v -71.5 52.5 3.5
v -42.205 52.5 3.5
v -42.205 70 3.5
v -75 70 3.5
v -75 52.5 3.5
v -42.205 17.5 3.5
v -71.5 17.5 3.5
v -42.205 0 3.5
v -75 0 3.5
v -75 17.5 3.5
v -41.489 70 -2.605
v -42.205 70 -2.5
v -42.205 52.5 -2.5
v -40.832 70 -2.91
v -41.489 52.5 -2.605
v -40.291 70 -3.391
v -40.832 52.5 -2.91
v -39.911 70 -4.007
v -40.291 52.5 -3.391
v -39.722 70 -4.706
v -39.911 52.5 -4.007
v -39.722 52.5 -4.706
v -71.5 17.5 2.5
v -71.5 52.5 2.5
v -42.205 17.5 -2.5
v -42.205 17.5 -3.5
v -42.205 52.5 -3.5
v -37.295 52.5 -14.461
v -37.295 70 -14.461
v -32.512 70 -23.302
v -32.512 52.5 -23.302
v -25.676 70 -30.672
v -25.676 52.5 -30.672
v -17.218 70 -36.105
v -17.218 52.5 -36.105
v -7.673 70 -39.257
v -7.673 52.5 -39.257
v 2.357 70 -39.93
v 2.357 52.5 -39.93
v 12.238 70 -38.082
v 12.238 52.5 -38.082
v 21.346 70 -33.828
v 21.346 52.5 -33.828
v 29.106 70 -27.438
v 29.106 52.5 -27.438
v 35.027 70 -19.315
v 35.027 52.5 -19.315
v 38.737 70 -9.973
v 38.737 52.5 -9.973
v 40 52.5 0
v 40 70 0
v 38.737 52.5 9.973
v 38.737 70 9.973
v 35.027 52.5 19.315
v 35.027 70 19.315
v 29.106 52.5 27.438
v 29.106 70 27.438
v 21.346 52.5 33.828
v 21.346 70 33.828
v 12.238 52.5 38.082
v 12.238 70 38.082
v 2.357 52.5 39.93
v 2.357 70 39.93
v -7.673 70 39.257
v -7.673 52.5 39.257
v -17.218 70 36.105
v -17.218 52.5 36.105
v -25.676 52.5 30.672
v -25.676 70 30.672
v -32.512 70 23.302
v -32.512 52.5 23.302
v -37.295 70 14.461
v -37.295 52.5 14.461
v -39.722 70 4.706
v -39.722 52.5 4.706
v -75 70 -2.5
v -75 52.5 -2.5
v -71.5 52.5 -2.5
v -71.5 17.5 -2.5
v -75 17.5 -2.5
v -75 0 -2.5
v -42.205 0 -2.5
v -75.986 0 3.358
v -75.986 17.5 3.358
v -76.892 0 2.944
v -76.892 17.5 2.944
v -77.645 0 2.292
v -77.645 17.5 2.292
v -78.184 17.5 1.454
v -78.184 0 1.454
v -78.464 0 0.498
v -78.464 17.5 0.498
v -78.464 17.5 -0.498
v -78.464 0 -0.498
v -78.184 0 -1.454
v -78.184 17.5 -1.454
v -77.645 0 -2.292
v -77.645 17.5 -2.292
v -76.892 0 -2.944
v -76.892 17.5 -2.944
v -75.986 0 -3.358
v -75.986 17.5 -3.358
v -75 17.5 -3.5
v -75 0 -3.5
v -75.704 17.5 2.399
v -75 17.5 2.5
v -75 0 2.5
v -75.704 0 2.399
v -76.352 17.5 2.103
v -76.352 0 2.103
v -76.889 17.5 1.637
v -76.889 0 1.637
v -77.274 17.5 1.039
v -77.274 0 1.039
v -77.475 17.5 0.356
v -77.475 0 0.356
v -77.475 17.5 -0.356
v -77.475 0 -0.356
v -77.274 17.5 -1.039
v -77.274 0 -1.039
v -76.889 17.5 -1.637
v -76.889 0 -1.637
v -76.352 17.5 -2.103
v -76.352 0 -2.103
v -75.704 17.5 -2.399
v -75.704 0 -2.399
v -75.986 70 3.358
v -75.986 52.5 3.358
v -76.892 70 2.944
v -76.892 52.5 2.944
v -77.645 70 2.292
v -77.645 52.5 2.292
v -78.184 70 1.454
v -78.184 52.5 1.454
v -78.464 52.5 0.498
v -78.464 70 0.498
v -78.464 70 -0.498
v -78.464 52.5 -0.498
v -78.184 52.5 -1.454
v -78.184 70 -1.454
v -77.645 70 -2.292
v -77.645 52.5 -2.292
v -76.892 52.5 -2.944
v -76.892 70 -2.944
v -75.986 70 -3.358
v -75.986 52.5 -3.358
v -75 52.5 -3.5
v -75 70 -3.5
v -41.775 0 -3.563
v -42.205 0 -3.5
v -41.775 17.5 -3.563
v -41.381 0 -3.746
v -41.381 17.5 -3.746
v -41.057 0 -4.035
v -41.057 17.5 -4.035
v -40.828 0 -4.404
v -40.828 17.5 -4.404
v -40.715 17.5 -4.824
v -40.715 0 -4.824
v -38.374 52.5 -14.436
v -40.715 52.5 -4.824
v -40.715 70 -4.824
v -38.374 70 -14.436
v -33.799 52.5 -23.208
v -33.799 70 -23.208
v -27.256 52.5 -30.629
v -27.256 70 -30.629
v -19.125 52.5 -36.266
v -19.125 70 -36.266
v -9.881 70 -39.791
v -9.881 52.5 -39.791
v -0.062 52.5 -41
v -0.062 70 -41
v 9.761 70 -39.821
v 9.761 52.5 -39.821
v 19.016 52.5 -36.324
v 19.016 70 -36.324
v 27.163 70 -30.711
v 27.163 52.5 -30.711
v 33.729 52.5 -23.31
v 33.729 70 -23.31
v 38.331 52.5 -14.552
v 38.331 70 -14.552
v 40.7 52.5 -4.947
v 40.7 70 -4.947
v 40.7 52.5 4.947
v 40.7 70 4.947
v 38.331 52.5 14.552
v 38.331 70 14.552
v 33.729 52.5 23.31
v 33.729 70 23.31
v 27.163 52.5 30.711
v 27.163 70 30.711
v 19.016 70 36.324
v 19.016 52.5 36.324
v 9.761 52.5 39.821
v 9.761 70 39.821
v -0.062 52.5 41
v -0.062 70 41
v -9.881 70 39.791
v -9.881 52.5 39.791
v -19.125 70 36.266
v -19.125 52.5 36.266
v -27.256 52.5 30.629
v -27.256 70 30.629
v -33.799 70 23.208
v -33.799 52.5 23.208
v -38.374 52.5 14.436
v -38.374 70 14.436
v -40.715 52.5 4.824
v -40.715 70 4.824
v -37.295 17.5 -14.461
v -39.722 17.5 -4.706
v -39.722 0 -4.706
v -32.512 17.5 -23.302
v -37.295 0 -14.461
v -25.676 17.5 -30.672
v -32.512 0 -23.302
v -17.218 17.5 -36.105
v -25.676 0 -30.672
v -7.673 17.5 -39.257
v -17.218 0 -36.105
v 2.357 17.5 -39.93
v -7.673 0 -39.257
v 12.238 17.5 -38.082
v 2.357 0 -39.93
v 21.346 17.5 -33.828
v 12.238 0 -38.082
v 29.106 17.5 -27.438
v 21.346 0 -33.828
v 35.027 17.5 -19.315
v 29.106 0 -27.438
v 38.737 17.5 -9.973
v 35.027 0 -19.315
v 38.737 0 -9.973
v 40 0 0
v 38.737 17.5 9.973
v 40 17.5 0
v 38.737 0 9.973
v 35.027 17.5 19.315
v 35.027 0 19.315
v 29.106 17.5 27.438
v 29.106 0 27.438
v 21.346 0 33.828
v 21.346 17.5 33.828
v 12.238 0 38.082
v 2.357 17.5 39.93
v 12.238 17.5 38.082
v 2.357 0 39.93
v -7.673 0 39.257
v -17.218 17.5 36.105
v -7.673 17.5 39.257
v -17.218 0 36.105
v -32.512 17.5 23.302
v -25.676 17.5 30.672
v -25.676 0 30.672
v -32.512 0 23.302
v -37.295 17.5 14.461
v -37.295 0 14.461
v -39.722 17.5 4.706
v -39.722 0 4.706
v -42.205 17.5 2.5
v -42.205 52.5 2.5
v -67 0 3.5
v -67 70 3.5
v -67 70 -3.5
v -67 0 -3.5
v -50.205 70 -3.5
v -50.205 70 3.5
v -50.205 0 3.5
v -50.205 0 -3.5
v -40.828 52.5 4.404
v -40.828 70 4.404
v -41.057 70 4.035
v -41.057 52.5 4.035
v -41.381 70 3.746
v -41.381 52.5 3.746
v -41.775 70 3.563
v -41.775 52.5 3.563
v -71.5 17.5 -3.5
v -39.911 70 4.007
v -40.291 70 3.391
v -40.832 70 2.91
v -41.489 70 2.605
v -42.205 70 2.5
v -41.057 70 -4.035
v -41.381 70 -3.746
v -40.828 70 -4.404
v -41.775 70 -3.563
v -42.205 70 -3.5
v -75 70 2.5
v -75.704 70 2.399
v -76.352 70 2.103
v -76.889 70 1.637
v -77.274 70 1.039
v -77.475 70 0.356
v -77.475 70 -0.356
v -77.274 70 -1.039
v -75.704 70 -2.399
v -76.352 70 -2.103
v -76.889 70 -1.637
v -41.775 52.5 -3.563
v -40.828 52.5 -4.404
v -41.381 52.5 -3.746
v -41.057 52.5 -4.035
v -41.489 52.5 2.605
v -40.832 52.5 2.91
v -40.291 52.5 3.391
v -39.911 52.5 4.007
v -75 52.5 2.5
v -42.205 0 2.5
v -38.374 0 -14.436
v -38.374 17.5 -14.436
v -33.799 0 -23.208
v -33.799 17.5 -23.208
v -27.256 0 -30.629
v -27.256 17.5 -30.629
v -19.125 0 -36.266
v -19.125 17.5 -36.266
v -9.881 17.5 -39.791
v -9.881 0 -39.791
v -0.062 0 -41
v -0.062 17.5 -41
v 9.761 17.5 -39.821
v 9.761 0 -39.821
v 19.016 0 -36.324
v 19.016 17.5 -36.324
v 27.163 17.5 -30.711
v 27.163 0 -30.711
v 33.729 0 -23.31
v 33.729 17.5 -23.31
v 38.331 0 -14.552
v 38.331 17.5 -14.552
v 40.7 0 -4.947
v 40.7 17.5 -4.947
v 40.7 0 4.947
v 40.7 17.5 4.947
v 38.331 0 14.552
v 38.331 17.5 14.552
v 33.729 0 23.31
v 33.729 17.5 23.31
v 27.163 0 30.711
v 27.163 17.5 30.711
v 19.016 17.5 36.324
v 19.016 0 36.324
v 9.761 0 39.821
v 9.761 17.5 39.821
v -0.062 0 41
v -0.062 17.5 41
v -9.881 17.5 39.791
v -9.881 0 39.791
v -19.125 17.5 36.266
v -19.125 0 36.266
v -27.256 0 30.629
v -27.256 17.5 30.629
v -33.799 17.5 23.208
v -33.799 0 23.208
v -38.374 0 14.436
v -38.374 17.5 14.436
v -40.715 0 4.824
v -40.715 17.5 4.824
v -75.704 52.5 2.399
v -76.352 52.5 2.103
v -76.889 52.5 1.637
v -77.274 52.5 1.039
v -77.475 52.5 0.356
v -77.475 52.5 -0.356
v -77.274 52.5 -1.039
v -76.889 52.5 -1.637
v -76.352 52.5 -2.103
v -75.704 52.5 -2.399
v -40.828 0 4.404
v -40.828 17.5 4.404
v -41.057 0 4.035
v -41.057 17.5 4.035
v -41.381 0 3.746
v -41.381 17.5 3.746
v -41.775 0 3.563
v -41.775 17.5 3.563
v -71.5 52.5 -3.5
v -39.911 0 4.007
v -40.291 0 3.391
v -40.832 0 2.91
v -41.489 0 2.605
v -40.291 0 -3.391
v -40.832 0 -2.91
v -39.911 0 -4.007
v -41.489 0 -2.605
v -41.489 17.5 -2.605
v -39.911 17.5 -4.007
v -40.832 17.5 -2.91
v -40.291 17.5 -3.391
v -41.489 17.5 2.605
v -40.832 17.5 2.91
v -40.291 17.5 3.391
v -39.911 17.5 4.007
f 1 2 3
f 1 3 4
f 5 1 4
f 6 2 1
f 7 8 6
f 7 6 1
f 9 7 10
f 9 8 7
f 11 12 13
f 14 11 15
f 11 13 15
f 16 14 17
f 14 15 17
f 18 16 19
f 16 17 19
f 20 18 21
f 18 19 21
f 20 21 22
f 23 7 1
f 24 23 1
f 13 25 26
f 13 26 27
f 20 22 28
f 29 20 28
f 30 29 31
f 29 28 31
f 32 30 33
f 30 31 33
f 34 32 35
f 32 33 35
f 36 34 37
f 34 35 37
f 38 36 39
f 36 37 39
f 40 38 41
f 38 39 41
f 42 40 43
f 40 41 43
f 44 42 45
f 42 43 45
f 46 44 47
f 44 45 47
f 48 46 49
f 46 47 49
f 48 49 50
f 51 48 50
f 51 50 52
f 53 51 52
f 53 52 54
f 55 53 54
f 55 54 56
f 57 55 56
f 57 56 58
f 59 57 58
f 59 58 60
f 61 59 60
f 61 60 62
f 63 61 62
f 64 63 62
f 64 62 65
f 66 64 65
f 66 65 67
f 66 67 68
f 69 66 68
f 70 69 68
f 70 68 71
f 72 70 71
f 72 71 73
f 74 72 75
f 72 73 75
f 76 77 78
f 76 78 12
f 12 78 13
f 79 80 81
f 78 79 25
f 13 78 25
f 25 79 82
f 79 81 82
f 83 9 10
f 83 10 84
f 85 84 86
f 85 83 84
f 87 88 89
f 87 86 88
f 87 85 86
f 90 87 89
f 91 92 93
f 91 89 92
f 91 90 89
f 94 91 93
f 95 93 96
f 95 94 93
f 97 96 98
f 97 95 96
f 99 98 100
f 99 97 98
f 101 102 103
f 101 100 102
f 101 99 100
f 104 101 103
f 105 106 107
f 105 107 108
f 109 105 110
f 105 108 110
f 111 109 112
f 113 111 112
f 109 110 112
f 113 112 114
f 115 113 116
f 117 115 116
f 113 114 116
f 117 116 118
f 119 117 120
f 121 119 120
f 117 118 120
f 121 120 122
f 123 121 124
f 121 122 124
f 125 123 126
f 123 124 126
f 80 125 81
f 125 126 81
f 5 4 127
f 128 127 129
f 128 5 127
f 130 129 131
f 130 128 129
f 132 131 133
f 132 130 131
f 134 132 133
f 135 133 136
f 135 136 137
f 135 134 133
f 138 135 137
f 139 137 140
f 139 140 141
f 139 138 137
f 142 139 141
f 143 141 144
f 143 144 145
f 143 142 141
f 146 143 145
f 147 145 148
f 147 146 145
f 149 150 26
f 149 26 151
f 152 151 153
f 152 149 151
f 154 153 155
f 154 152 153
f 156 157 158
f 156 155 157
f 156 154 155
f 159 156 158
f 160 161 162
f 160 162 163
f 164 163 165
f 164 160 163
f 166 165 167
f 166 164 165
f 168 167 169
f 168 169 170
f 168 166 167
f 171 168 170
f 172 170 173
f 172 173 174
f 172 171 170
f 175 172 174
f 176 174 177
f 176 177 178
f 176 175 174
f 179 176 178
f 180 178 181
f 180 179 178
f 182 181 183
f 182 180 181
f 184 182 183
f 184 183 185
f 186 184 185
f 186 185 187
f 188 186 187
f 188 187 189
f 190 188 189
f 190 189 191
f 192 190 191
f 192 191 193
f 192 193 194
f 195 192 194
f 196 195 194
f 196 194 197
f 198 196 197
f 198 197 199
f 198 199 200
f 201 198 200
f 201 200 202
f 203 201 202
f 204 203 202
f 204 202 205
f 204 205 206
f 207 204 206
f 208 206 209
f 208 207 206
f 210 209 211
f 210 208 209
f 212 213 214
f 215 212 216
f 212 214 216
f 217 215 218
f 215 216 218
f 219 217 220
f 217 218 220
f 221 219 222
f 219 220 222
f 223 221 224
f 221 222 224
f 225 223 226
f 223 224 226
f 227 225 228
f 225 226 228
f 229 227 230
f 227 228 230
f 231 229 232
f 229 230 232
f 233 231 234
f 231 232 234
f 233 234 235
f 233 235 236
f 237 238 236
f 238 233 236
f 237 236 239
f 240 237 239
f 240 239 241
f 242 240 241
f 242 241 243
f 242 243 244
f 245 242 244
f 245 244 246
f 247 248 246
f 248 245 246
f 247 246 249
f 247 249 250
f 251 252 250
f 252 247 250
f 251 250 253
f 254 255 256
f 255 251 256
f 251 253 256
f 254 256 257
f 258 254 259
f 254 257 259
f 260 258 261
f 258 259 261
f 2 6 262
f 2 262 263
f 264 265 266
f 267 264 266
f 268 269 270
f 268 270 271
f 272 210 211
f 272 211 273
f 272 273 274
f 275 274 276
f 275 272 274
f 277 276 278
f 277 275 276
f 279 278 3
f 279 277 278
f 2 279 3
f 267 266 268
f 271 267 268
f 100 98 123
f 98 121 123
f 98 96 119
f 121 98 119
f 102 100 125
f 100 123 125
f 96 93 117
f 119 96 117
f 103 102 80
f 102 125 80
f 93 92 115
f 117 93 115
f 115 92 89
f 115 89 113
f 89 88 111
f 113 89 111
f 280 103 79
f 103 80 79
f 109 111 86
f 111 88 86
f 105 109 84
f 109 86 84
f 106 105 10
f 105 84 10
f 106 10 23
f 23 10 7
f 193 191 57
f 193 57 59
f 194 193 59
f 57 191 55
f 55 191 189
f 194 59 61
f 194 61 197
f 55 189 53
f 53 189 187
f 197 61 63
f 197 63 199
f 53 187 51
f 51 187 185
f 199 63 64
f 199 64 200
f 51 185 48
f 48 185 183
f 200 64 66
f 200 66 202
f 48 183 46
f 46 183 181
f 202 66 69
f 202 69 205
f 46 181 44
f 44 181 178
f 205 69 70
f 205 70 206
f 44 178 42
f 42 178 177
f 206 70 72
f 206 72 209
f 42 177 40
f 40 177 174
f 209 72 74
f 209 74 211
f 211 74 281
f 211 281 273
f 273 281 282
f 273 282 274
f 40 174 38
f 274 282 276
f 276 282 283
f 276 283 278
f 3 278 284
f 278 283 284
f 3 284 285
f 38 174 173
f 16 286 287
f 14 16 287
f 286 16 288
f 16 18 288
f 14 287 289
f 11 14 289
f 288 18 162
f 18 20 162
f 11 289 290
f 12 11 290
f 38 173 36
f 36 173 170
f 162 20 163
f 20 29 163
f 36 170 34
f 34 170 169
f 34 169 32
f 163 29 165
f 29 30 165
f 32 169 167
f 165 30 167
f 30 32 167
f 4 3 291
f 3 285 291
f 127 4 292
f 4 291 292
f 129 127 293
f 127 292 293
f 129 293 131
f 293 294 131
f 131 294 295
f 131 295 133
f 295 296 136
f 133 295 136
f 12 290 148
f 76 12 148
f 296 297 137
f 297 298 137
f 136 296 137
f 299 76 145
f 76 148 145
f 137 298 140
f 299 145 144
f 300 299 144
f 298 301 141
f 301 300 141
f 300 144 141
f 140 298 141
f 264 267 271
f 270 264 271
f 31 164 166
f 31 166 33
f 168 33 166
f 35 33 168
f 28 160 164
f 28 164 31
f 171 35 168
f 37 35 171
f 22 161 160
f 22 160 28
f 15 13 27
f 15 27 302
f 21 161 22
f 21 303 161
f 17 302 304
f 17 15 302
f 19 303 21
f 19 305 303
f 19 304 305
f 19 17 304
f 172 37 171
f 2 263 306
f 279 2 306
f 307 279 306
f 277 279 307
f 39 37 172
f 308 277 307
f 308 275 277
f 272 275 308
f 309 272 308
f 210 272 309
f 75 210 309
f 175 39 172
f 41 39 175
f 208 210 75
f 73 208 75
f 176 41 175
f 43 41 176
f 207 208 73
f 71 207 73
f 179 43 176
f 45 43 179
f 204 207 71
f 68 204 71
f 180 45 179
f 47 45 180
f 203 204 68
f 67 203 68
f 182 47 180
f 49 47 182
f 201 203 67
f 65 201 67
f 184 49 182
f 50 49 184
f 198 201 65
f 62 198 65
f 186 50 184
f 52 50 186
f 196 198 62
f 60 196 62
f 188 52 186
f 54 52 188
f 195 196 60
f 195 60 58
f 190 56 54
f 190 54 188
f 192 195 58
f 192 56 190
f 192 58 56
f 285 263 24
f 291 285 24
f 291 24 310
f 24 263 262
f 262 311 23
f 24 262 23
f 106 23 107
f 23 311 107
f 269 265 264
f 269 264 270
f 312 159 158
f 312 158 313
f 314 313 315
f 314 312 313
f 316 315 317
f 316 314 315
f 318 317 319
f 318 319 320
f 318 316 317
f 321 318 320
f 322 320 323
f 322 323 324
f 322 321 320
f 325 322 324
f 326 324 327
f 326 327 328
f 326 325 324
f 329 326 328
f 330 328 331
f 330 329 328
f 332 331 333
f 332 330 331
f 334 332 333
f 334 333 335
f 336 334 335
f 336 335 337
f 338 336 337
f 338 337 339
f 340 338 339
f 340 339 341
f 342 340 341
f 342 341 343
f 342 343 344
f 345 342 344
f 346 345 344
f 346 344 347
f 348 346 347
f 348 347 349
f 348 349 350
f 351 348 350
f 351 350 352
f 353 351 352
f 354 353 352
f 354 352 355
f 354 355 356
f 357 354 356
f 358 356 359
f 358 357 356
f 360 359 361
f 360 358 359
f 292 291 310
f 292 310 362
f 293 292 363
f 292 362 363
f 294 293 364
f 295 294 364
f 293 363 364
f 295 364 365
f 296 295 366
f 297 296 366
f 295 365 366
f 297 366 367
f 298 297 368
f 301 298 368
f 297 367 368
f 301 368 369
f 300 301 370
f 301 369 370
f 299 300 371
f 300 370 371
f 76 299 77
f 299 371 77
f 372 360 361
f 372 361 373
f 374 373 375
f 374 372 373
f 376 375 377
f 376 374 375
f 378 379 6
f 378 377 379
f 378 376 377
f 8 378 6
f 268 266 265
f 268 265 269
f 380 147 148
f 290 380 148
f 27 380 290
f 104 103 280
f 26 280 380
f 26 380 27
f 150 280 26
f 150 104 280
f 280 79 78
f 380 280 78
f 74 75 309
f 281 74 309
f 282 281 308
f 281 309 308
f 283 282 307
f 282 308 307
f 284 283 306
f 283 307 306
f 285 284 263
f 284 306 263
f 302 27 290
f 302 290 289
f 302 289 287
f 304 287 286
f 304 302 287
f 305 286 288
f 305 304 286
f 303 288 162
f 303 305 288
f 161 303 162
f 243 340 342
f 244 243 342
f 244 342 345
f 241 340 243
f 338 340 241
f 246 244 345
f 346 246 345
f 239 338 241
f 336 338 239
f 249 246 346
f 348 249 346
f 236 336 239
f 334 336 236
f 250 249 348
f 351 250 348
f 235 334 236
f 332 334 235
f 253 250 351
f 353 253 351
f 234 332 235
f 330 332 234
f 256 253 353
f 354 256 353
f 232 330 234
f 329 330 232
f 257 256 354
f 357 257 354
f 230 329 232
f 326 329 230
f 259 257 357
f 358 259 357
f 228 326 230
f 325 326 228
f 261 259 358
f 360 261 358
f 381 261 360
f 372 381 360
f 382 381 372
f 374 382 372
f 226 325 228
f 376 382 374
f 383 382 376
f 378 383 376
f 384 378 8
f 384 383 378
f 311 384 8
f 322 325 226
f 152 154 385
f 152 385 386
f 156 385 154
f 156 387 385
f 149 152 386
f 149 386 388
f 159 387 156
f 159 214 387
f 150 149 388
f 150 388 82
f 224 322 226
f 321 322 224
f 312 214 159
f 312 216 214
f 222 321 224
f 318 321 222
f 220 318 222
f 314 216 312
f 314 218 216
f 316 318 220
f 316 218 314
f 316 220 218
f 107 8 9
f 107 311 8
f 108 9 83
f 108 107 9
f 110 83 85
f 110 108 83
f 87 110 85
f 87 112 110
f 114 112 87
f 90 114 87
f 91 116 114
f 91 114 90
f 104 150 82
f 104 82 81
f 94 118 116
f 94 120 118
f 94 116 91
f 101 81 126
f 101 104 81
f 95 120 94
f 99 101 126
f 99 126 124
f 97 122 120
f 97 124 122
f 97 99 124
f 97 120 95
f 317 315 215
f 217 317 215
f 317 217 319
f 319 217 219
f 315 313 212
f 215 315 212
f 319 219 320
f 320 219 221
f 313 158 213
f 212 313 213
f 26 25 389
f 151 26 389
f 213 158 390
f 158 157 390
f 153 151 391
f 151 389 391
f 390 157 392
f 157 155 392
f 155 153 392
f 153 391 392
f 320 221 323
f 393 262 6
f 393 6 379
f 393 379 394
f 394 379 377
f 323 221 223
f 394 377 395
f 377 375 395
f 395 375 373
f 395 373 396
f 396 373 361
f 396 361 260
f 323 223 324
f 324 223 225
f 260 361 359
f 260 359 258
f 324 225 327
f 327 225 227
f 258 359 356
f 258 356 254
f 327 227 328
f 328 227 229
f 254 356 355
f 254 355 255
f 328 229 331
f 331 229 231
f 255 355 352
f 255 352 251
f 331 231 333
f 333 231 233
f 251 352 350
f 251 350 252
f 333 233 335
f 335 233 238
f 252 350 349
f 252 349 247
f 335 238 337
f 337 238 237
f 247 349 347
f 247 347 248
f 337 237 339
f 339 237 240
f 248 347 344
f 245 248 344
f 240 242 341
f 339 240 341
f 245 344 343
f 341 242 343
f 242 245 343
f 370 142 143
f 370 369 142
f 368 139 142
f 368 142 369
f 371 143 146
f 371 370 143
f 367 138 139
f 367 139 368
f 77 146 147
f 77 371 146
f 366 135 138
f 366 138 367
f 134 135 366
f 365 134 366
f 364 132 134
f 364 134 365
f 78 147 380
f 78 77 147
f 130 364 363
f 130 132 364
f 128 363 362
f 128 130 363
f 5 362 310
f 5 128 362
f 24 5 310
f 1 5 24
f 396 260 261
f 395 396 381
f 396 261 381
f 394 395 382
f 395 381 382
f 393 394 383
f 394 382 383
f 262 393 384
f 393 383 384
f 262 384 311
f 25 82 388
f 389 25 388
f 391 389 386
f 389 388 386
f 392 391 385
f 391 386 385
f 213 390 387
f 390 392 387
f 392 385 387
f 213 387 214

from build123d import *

# Parameters (mm, degrees)
BOSS_EXTRUDE1_DEPTH     = 70
SKETCH2_W               = 7
SKETCH2_H               = 35
CUT_EXTRUDE1_DEPTH      = 7
SKETCH3_W               = 84.40971508
SKETCH3_H               = 35
CUT_EXTRUDE2_DEPTH      = 38.5
CUT_EXTRUDE2_DEPTH_BACK = 45.5
SKETCH4_W               = 16.79514246
SKETCH4_H               = 7
BOSS_EXTRUDE2_DEPTH     = 70


with BuildPart() as part:
    # Sketch1 → Boss-Extrude1 (new body)
    with BuildSketch(Plane(origin=(0, 0, 0), x_dir=(1, 0, 0), z_dir=(0, 1, 0))):
        with BuildLine():
            Line((-75, 3.5), (-42.20485754, 3.5))
            ThreePointArc((-42.20485754, 3.5), (-41.208540794, 3.878682498), (-40.715274333, 4.823529412))
            ThreePointArc((-40.715274333, 4.823529412), (41, 0), (-40.715274333, -4.823529412))
            ThreePointArc((-40.715274333, -4.823529412), (-41.208540794, -3.878682498), (-42.20485754, -3.5))
            Line((-42.20485754, -3.5), (-75, -3.5))
            ThreePointArc((-75, -3.5), (-78.5, 0), (-75, 3.5))
        make_face()
        with BuildLine():
            Line((-75, 2.5), (-42.20485754, 2.5))
            ThreePointArc((-42.20485754, 2.5), (-40.54432963, 3.131137496), (-39.722218861, 4.705882353))
            ThreePointArc((-39.722218861, 4.705882353), (40, 0), (-39.722218861, -4.705882353))
            ThreePointArc((-39.722218861, -4.705882353), (-40.54432963, -3.131137496), (-42.20485754, -2.5))
            Line((-42.20485754, -2.5), (-75, -2.5))
            ThreePointArc((-75, -2.5), (-77.5, 0), (-75, 2.5))
        make_face(mode=Mode.SUBTRACT)
    extrude(amount=BOSS_EXTRUDE1_DEPTH)

    # Sketch2 → Cut-Extrude1 (cut)
    with BuildSketch(Plane.XY.offset(3.5)):
        with Locations((-75, 35)):
            Rectangle(SKETCH2_W, SKETCH2_H)
    extrude(amount=-CUT_EXTRUDE1_DEPTH, mode=Mode.SUBTRACT)

    # Sketch3 → Cut-Extrude2 (cut, two sides)
    with BuildSketch(Plane.XY.offset(3.5)) as cut_extrude2_sk:
        with Locations((0, 35)):
            Rectangle(SKETCH3_W, SKETCH3_H)
    extrude(amount=CUT_EXTRUDE2_DEPTH, mode=Mode.SUBTRACT)
    extrude(cut_extrude2_sk.sketch, amount=-CUT_EXTRUDE2_DEPTH_BACK, mode=Mode.SUBTRACT)


with BuildPart() as body_2:
    # Sketch4 → Boss-Extrude2 (new body)
    with BuildSketch(Plane(origin=(0, 70, 0), x_dir=(1, 0, 0), z_dir=(0, 1, 0))):
        with Locations((-58.60242877, 0)):
            Rectangle(SKETCH4_W, SKETCH4_H)
    extrude(amount=-BOSS_EXTRUDE2_DEPTH)


solid = Compound([part.part, body_2.part])
